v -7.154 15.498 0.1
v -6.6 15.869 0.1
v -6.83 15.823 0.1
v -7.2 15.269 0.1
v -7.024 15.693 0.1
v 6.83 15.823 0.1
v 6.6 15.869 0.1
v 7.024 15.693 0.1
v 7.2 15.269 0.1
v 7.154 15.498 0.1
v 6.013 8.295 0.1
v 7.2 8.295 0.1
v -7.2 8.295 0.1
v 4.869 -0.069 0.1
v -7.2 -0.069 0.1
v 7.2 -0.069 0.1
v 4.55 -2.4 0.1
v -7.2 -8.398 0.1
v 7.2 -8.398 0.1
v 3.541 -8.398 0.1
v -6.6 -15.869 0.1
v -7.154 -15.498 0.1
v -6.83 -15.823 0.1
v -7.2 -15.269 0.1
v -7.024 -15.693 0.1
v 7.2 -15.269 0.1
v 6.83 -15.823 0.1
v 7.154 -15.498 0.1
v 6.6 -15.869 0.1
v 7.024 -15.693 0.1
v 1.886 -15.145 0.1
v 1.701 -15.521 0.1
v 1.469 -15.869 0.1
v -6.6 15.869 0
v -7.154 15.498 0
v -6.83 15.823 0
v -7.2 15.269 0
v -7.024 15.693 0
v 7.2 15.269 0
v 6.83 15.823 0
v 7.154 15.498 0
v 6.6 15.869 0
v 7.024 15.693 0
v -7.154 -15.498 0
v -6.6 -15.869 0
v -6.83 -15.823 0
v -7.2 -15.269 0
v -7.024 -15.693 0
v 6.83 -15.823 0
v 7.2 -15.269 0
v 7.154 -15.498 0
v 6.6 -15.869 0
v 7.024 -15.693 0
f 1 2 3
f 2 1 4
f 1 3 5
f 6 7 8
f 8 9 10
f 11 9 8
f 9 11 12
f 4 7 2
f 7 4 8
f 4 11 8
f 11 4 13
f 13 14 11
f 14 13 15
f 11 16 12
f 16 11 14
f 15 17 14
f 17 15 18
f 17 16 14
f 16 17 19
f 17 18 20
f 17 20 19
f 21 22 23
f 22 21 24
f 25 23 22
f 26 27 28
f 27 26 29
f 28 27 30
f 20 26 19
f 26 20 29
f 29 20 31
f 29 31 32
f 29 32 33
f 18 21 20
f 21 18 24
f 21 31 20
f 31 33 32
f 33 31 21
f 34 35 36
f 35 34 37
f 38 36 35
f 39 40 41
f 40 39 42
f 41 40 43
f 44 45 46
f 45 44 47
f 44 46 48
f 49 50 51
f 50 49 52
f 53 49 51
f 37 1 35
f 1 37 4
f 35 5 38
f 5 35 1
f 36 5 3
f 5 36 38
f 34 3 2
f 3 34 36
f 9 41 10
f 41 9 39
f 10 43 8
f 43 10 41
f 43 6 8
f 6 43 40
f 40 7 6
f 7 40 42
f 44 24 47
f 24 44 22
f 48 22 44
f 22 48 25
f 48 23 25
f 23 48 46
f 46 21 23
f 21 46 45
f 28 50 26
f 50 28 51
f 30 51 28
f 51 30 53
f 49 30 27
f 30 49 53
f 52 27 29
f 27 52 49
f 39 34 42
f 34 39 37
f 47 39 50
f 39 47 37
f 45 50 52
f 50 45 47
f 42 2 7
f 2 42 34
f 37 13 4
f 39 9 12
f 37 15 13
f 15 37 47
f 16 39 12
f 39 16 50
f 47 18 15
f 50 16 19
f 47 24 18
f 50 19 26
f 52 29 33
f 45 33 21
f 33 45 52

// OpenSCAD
// file: ../p/1-4cyli.scad
use <../lib.scad>
function ldraw_lib__1_4cyli() = [
// 0 Cylinder 0.25
// 0 Name: 1-4cyli.dat
// 0 Author: James Jessiman
// 0 !LDRAW_ORG Primitive UPDATE 2012-01
// 0 !LICENSE Licensed under CC BY 4.0 : see CAreadme.txt
// 
// 0 BFC CERTIFY CCW
  [0,"BFC","CERTIFY"],
  [0,"BFC","CCW"],
// 
// 0 !HISTORY 2002-03-23 [sbliss] Added BFC statement.
// 0 !HISTORY 2002-04-25 [PTadmin] Official Update 2002-02
// 0 !HISTORY 2007-06-22 [PTadmin] Header formatted for Contributor Agreement
// 0 !HISTORY 2008-07-01 [PTadmin] Official Update 2008-01
// 0 !HISTORY 2012-02-16 [Philo] Changed to CCW
// 0 !HISTORY 2012-03-30 [PTadmin] Official Update 2012-01
// 
// 
// 4 16 1 1 0 0.9239 1 0.3827 0.9239 0 0.3827 1 0 0
  [4,16,1,1,0,0.9239,1,0.3827,0.9239,0,0.3827,1,0,0],
// 5 24 1 0 0 1 1 0 0.9239 0 0.3827 1 0 -1
  [5,24,1,0,0,1,1,0,0.9239,0,0.3827,1,0,-1],
// 4 16 0.9239 1 0.3827 0.7071 1 0.7071 0.7071 0 0.7071 0.9239 0 0.3827
  [4,16,0.9239,1,0.3827,0.7071,1,0.7071,0.7071,0,0.7071,0.9239,0,0.3827],
// 5 24 0.9239 0 0.3827 0.9239 1 0.3827 0.7071 0 0.7071 1 0 0
  [5,24,0.9239,0,0.3827,0.9239,1,0.3827,0.7071,0,0.7071,1,0,0],
// 4 16 0.7071 1 0.7071 0.3827 1 0.9239 0.3827 0 0.9239 0.7071 0 0.7071
  [4,16,0.7071,1,0.7071,0.3827,1,0.9239,0.3827,0,0.9239,0.7071,0,0.7071],
// 5 24 0.7071 0 0.7071 0.7071 1 0.7071 0.3827 0 0.9239 0.9239 0 0.3827
  [5,24,0.7071,0,0.7071,0.7071,1,0.7071,0.3827,0,0.9239,0.9239,0,0.3827],
// 4 16 0.3827 1 0.9239 0 1 1 0 0 1 0.3827 0 0.9239
  [4,16,0.3827,1,0.9239,0,1,1,0,0,1,0.3827,0,0.9239],
// 5 24 0.3827 0 0.9239 0.3827 1 0.9239 0 0 1 0.7071 0 0.7071
  [5,24,0.3827,0,0.9239,0.3827,1,0.9239,0,0,1,0.7071,0,0.7071],
// 5 24 0 0 1 0 1 1 0.3827 0 0.9239 -1 0 1
  [5,24,0,0,1,0,1,1,0.3827,0,0.9239,-1,0,1],
];
module ldraw_lib__1_4cyli(step=0, col=false, unit=2/5, alt=false, line=0.2, solid=!$preview)
    makepoly(ldraw_lib__1_4cyli(), step=step, col=col, unit=unit, alt=alt, line=line, solid=solid);
ldraw_lib__1_4cyli(line=0.2);
// file: ../p/1-8chrd.scad
use <../lib.scad>
function ldraw_lib__1_8chrd() = [
// 0 Chord 0.125
// 0 Name: 1-8chrd.dat
// 0 Author: Andy Westrate [westrate]
// 0 !LDRAW_ORG Primitive UPDATE 2004-02
// 0 !LICENSE Licensed under CC BY 2.0 and CC BY 4.0 : see CAreadme.txt
// 
// 0 BFC CERTIFY CCW
  [0,"BFC","CERTIFY"],
  [0,"BFC","CCW"],
// 
// 0 !HISTORY 2004-04-22 [PTadmin] Official Update 2004-02
// 0 !HISTORY 2007-06-22 [PTadmin] Header formatted for Contributor Agreement
// 0 !HISTORY 2008-07-01 [PTadmin] Official Update 2008-01
// 
// 
// 3 16 0.7071 0 0.7071 1 0 0 0.9239 0 0.3827
  [3,16,0.7071,0,0.7071,1,0,0,0.9239,0,0.3827],
// 
// 0
];
module ldraw_lib__1_8chrd(step=0, col=false, unit=2/5, alt=false, line=0.2, solid=!$preview)
    makepoly(ldraw_lib__1_8chrd(), step=step, col=col, unit=unit, alt=alt, line=line, solid=solid);
ldraw_lib__1_8chrd(line=0.2);
// file: ../p/1-4chrd.scad
use <../lib.scad>
function ldraw_lib__1_4chrd() = [
// 0 Chord 0.25
// 0 Name: 1-4chrd.dat
// 0 Author: Tony Hafner [hafhead]
// 0 !LDRAW_ORG Primitive UPDATE 2012-02
// 0 !LICENSE Licensed under CC BY 2.0 and CC BY 4.0 : see CAreadme.txt
// 
// 0 BFC CERTIFY CCW
  [0,"BFC","CERTIFY"],
  [0,"BFC","CCW"],
// 
// 0 !HISTORY 2004-04-22 [PTadmin] Official Update 2004-02
// 0 !HISTORY 2007-10-09 [PTadmin] Header formatted for Contributor Agreement
// 0 !HISTORY 2008-07-01 [PTadmin] Official Update 2008-01
// 0 !HISTORY 2012-08-02 [MMR1988] Re-creation with PrimGen2 and Rectifier
// 0 !HISTORY 2012-08-09 [PTadmin] Official Update 2012-02
// 
// 
// 4 16 0.9239 0 0.3827 0.3827 0 0.9239 0 0 1 1 0 0
  [4,16,0.9239,0,0.3827,0.3827,0,0.9239,0,0,1,1,0,0],
// 3 16 0.7071 0 0.7071 0.3827 0 0.9239 0.9239 0 0.3827
  [3,16,0.7071,0,0.7071,0.3827,0,0.9239,0.9239,0,0.3827],
];
module ldraw_lib__1_4chrd(step=0, col=false, unit=2/5, alt=false, line=0.2, solid=!$preview)
    makepoly(ldraw_lib__1_4chrd(), step=step, col=col, unit=unit, alt=alt, line=line, solid=solid);
ldraw_lib__1_4chrd(line=0.2);
// file: s/6142622ts05.scad
use <../../lib.scad>
use <../../p/1-4chrd.scad>
use <../../p/1-4cyli.scad>
function ldraw_lib__s__6142622ts05() = [
// 0 ~Sticker  4.0 x  1.8 with Black Arch on Yellow Background Right - Underside Flat
// 0 Name: s\6142622ts05.dat
// 0 Author: Massimo Maso [Sirio]
// 0 !LDRAW_ORG Subpart UPDATE 2022-03
// 0 !LICENSE Licensed under CC BY 4.0 : see CAreadme.txt
// 
// 0 BFC CERTIFY CCW
  [0,"BFC","CERTIFY"],
  [0,"BFC","CCW"],
// 
// 0 !HISTORY 2022-05-07 [PTadmin] Official Update 2022-03
// 
// 
// 0 // Primitives
// 
// 1 16 -16.5 0 38.1717 -1.5 0 0 0 -1 0 0 0 1.5 1-4chrd.dat
  [1,16,-16.5,0,38.1717,-1.5,0,0,0,-1,0,0,0,1.5, ldraw_lib__1_4chrd()],
// 1 16 16.5 0 38.1717 1.5 0 0 0 -1 0 0 0 1.5 1-4chrd.dat
  [1,16,16.5,0,38.1717,1.5,0,0,0,-1,0,0,0,1.5, ldraw_lib__1_4chrd()],
// 1 16 -16.5 0 -38.1717 -1.5 0 0 0 -1 0 0 0 -1.5 1-4chrd.dat
  [1,16,-16.5,0,-38.1717,-1.5,0,0,0,-1,0,0,0,-1.5, ldraw_lib__1_4chrd()],
// 1 16 16.5 0 -38.1717 1.5 0 0 0 -1 0 0 0 -1.5 1-4chrd.dat
  [1,16,16.5,0,-38.1717,1.5,0,0,0,-1,0,0,0,-1.5, ldraw_lib__1_4chrd()],
// 1 16 -16.5 -0.25 38.1717 -1.5 0 0 0 0.25 0 0 0 1.5 1-4cyli.dat
  [1,16,-16.5,-0.25,38.1717,-1.5,0,0,0,0.25,0,0,0,1.5, ldraw_lib__1_4cyli()],
// 1 16 16.5 -0.25 38.1717 1.5 0 0 0 0.25 0 0 0 1.5 1-4cyli.dat
  [1,16,16.5,-0.25,38.1717,1.5,0,0,0,0.25,0,0,0,1.5, ldraw_lib__1_4cyli()],
// 1 16 -16.5 -0.25 -38.1717 -1.5 0 0 0 0.25 0 0 0 -1.5 1-4cyli.dat
  [1,16,-16.5,-0.25,-38.1717,-1.5,0,0,0,0.25,0,0,0,-1.5, ldraw_lib__1_4cyli()],
// 1 16 16.5 -0.25 -38.1717 1.5 0 0 0 0.25 0 0 0 -1.5 1-4cyli.dat
  [1,16,16.5,-0.25,-38.1717,1.5,0,0,0,0.25,0,0,0,-1.5, ldraw_lib__1_4cyli()],
// 0 // Bottom face
// 4 16 16.5 0 39.6717 18 0 38.1717 -18 0 38.1717 -16.5 0 39.6717
  [4,16,16.5,0,39.6717,18,0,38.1717,-18,0,38.1717,-16.5,0,39.6717],
// 4 16 18 0 38.1717 18 0 -38.1717 -18 0 -38.1717 -18 0 38.1717
  [4,16,18,0,38.1717,18,0,-38.1717,-18,0,-38.1717,-18,0,38.1717],
// 4 16 -18 0 -38.1717 18 0 -38.1717 16.5 0 -39.6717 -16.5 0 -39.6717
  [4,16,-18,0,-38.1717,18,0,-38.1717,16.5,0,-39.6717,-16.5,0,-39.6717],
// 0 // Lateral faces
// 4 16 16.5 0 39.6717 -16.5 0 39.6717 -16.5 -.25 39.6717 16.5 -.25 39.6717
  [4,16,16.5,0,39.6717,-16.5,0,39.6717,-16.5,-.25,39.6717,16.5,-.25,39.6717],
// 3 16 -18 0 38.1717 -18 -.25 20.737 -18 -.25 38.1717
  [3,16,-18,0,38.1717,-18,-.25,20.737,-18,-.25,38.1717],
// 3 16 18 0 38.1717 18 -.25 38.1717 18 -.25 20.737
  [3,16,18,0,38.1717,18,-.25,38.1717,18,-.25,20.737],
// 4 16 -18 0 38.1717 -18 0 -38.1717 -18 -.25 -.1714 -18 -.25 20.737
  [4,16,-18,0,38.1717,-18,0,-38.1717,-18,-.25,-.1714,-18,-.25,20.737],
// 4 16 18 0 38.1717 18 -.25 20.737 18 -.25 -.1714 18 0 -38.1717
  [4,16,18,0,38.1717,18,-.25,20.737,18,-.25,-.1714,18,0,-38.1717],
// 3 16 -18 0 -38.1717 -18 -.25 -20.994 -18 -.25 -.1714
  [3,16,-18,0,-38.1717,-18,-.25,-20.994,-18,-.25,-.1714],
// 3 16 18 0 -38.1717 18 -.25 -.1714 18 -.25 -20.994
  [3,16,18,0,-38.1717,18,-.25,-.1714,18,-.25,-20.994],
// 3 16 -18 0 -38.1717 -18 -.25 -38.1717 -18 -.25 -20.994
  [3,16,-18,0,-38.1717,-18,-.25,-38.1717,-18,-.25,-20.994],
// 3 16 18 0 -38.1717 18 -.25 -20.994 18 -.25 -38.1717
  [3,16,18,0,-38.1717,18,-.25,-20.994,18,-.25,-38.1717],
// 3 16 16.5 0 -39.6717 16.5 -.25 -39.6717 3.6722 -.25 -39.6717
  [3,16,16.5,0,-39.6717,16.5,-.25,-39.6717,3.6722,-.25,-39.6717],
// 4 16 16.5 0 -39.6717 3.6722 -.25 -39.6717 -16.5 -.25 -39.6717 -16.5 0 -39.6717
  [4,16,16.5,0,-39.6717,3.6722,-.25,-39.6717,-16.5,-.25,-39.6717,-16.5,0,-39.6717],
];
module ldraw_lib__s__6142622ts05(step=0, col=false, unit=2/5, alt=false, line=0.2, solid=!$preview)
    makepoly(ldraw_lib__s__6142622ts05(), step=step, col=col, unit=unit, alt=alt, line=line, solid=solid);
ldraw_lib__s__6142622ts05(line=0.2);
// file: s/6142622ts04.scad
use <../../lib.scad>
use <../../p/1-4chrd.scad>
function ldraw_lib__s__6142622ts04() = [
// 0 ~Sticker  4.0 x  1.8 with Black Arch on Yellow Background Right - Upper Section 4
// 0 Name: s\6142622ts04.dat
// 0 Author: Massimo Maso [Sirio]
// 0 !LDRAW_ORG Subpart UPDATE 2022-03
// 0 !LICENSE Licensed under CC BY 4.0 : see CAreadme.txt
// 
// 0 BFC CERTIFY CCW
  [0,"BFC","CERTIFY"],
  [0,"BFC","CCW"],
// 
// 0 !HISTORY 2022-05-07 [PTadmin] Official Update 2022-03
// 
// 
// 0 // Primitives
// 
// 1 0 -16.5 -.25 -17.162 -1.5 0 0 0 1 0 0 0 -1.5 1-4chrd.dat
  [1,0,-16.5,-.25,-17.162,-1.5,0,0,0,1,0,0,0,-1.5, ldraw_lib__1_4chrd()],
// 1 14 16.5 -.25 -17.162 1.5 0 0 0 1 0 0 0 -1.5 1-4chrd.dat
  [1,14,16.5,-.25,-17.162,1.5,0,0,0,1,0,0,0,-1.5, ldraw_lib__1_4chrd()],
// 0 // Yellow faces
// 4 14 16.5 -.25 -18.662 18 -.25 -17.162 18 -.25 .0157 8.8524 -.25 .0157
  [4,14,16.5,-.25,-18.662,18,-.25,-17.162,18,-.25,.0157,8.8524,-.25,.0157],
// 3 14 16.5 -.25 -18.662 8.8524 -.25 .0157 4.7162 -.25 -16.8532
  [3,14,16.5,-.25,-18.662,8.8524,-.25,.0157,4.7162,-.25,-16.8532],
// 3 14 16.5 -.25 -18.662 4.7162 -.25 -16.8532 4.253 -.25 -17.7916
  [3,14,16.5,-.25,-18.662,4.7162,-.25,-16.8532,4.253,-.25,-17.7916],
// 3 14 16.5 -.25 -18.662 4.253 -.25 -17.7916 3.6722 -.25 -18.662
  [3,14,16.5,-.25,-18.662,4.253,-.25,-17.7916,3.6722,-.25,-18.662],
// 0 // Black faces
// 4 0 -16.5 -.25 -18.662 8.8524 -.25 .0157 -18 -.25 .0157 -18 -.25 -17.162
  [4,0,-16.5,-.25,-18.662,8.8524,-.25,.0157,-18,-.25,.0157,-18,-.25,-17.162],
// 3 0 -16.5 -.25 -18.662 4.7162 -.25 -16.8532 8.8524 -.25 .0157
  [3,0,-16.5,-.25,-18.662,4.7162,-.25,-16.8532,8.8524,-.25,.0157],
// 4 0 -16.5 -.25 -18.662 3.6722 -.25 -18.662 4.253 -.25 -17.7916 4.7162 -.25 -16.8532
  [4,0,-16.5,-.25,-18.662,3.6722,-.25,-18.662,4.253,-.25,-17.7916,4.7162,-.25,-16.8532],
];
module ldraw_lib__s__6142622ts04(step=0, col=false, unit=2/5, alt=false, line=0.2, solid=!$preview)
    makepoly(ldraw_lib__s__6142622ts04(), step=step, col=col, unit=unit, alt=alt, line=line, solid=solid);
ldraw_lib__s__6142622ts04(line=0.2);
// file: s/6142622ts03.scad
use <../../lib.scad>
function ldraw_lib__s__6142622ts03() = [
// 0 ~Sticker  4.0 x  1.8 with Black Arch on Yellow Background Right - Upper Section 3
// 0 Name: s\6142622ts03.dat
// 0 Author: Massimo Maso [Sirio]
// 0 !LDRAW_ORG Subpart UPDATE 2022-03
// 0 !LICENSE Licensed under CC BY 4.0 : see CAreadme.txt
// 
// 0 BFC CERTIFY CCW
  [0,"BFC","CERTIFY"],
  [0,"BFC","CCW"],
// 
// 0 !HISTORY 2022-05-07 [PTadmin] Official Update 2022-03
// 
// 
// 0 // Faces
// 
// 4 0 11.375 -.25 14.9783 12.1721 -.25 20.8069 -18 -.25 20.8069 -18 -.25 -.0157
  [4,0,11.375,-.25,14.9783,12.1721,-.25,20.8069,-18,-.25,20.8069,-18,-.25,-.0157],
// 4 14 11.375 -.25 14.9783 18 -.25 -.0157 18 -.25 20.8069 12.1721 -.25 20.8069
  [4,14,11.375,-.25,14.9783,18,-.25,-.0157,18,-.25,20.8069,12.1721,-.25,20.8069],
// 3 0 11.375 -.25 14.9783 -18 -.25 -.0157 8.8524 -.25 -.0157
  [3,0,11.375,-.25,14.9783,-18,-.25,-.0157,8.8524,-.25,-.0157],
// 3 14 11.375 -.25 14.9783 8.8524 -.25 -.0157 18 -.25 -.0157
  [3,14,11.375,-.25,14.9783,8.8524,-.25,-.0157,18,-.25,-.0157],
];
module ldraw_lib__s__6142622ts03(step=0, col=false, unit=2/5, alt=false, line=0.2, solid=!$preview)
    makepoly(ldraw_lib__s__6142622ts03(), step=step, col=col, unit=unit, alt=alt, line=line, solid=solid);
ldraw_lib__s__6142622ts03(line=0.2);
// file: s/6142622ts02.scad
use <../../lib.scad>
function ldraw_lib__s__6142622ts02() = [
// 0 ~Sticker  4.0 x  1.8 with Black Arch on Yellow Background Right - Upper Section 2
// 0 Name: s\6142622ts02.dat
// 0 Author: Massimo Maso [Sirio]
// 0 !LDRAW_ORG Subpart UPDATE 2022-03
// 0 !LICENSE Licensed under CC BY 4.0 : see CAreadme.txt
// 
// 0 BFC CERTIFY CCW
  [0,"BFC","CERTIFY"],
  [0,"BFC","CCW"],
// 
// 0 !HISTORY 2022-05-07 [PTadmin] Official Update 2022-03
// 
// 
// 0 // Faces
// 
// 4 0 15.0314 -.25 .0153 -18 -.25 .0153 -18 -.25 -20.8931 12.1721 -.25 -20.8931
  [4,0,15.0314,-.25,.0153,-18,-.25,.0153,-18,-.25,-20.8931,12.1721,-.25,-20.8931],
// 4 14 15.0314 -.25 .0153 12.1721 -.25 -20.8931 18 -.25 -20.8931 18 -.25 .0153
  [4,14,15.0314,-.25,.0153,12.1721,-.25,-20.8931,18,-.25,-20.8931,18,-.25,.0153],
];
module ldraw_lib__s__6142622ts02(step=0, col=false, unit=2/5, alt=false, line=0.2, solid=!$preview)
    makepoly(ldraw_lib__s__6142622ts02(), step=step, col=col, unit=unit, alt=alt, line=line, solid=solid);
ldraw_lib__s__6142622ts02(line=0.2);
// file: s/6142622ts01.scad
use <../../lib.scad>
use <../../p/1-4chrd.scad>
use <../../p/1-8chrd.scad>
function ldraw_lib__s__6142622ts01() = [
// 0 ~Sticker  4.0 x  1.8 with Black Arch on Yellow Background Right - Upper Section 1
// 0 Name: s\6142622ts01.dat
// 0 Author: Massimo Maso [Sirio]
// 0 !LDRAW_ORG Subpart UPDATE 2022-03
// 0 !LICENSE Licensed under CC BY 4.0 : see CAreadme.txt
// 
// 0 BFC CERTIFY CCW
  [0,"BFC","CERTIFY"],
  [0,"BFC","CCW"],
// 
// 0 !HISTORY 2022-05-07 [PTadmin] Official Update 2022-03
// 
// 
// 0 // Primitives
// 
// 1 0 -16.5 -.25 17.4194 -1.5 0 0 0 1 0 0 0 1.5 1-4chrd.dat
  [1,0,-16.5,-.25,17.4194,-1.5,0,0,0,1,0,0,0,1.5, ldraw_lib__1_4chrd()],
// 1 0 16.5 -.25 17.4194 0 0 1.5 0 1 0 1.5 0 0 1-8chrd.dat
  [1,0,16.5,-.25,17.4194,0,0,1.5,0,1,0,1.5,0,0, ldraw_lib__1_8chrd()],
// 1 14 16.5 -.25 17.4194 1.5 0 0 0 1 0 0 0 1.5 1-8chrd.dat
  [1,14,16.5,-.25,17.4194,1.5,0,0,0,1,0,0,0,1.5, ldraw_lib__1_8chrd()],
// 0 // Yellow face
// 4 14 17.56065 -.25 18.48005 15.0314 -.25 -.0153 18 -.25 -.0153 18 -.25 17.4194
  [4,14,17.56065,-.25,18.48005,15.0314,-.25,-.0153,18,-.25,-.0153,18,-.25,17.4194],
// 0 // Black faces
// 4 0 17.56065 -.25 18.48005 16.5 -.25 18.9194 -16.5 -.25 18.9194 -18 -.25 17.4194
  [4,0,17.56065,-.25,18.48005,16.5,-.25,18.9194,-16.5,-.25,18.9194,-18,-.25,17.4194],
// 4 0 17.56065 -.25 18.48005 -18 -.25 17.4194 -18 -.25 -.0153 15.0314 -.25 -.0153
  [4,0,17.56065,-.25,18.48005,-18,-.25,17.4194,-18,-.25,-.0153,15.0314,-.25,-.0153],
];
module ldraw_lib__s__6142622ts01(step=0, col=false, unit=2/5, alt=false, line=0.2, solid=!$preview)
    makepoly(ldraw_lib__s__6142622ts01(), step=step, col=col, unit=unit, alt=alt, line=line, solid=solid);
ldraw_lib__s__6142622ts01(line=0.2);
// main file
use <../lib.scad>
use <s/6142622ts01.scad>
use <s/6142622ts02.scad>
use <s/6142622ts03.scad>
use <s/6142622ts04.scad>
use <s/6142622ts05.scad>
function ldraw_lib__6142622t() = [
// 0 Sticker  4.0 x  1.8 with Black Arch on Yellow Background Right
// 0 Name: 6142622t.dat
// 0 Author: Massimo Maso [Sirio]
// 0 !LDRAW_ORG Part UPDATE 2022-03
// 0 !LICENSE Licensed under CC BY 4.0 : see CAreadme.txt
// 
// 0 BFC CERTIFY CCW
  [0,"BFC","CERTIFY"],
  [0,"BFC","CCW"],
// 
// 0 !KEYWORDS Chevrolet, Corvette, Set 75870, Speed Champions
// 
// 0 !HISTORY 2022-05-07 [PTadmin] Official Update 2022-03
// 
// 
// 1 16 0 0 20.7523 1 0 0 0 1 0 0 0 1 s\6142622ts01.dat
  [1,16,0,0,20.7523,1,0,0,0,1,0,0,0,1, ldraw_lib__s__6142622ts01()],
// 1 16 0 0 20.7217 1 0 0 0 1 0 0 0 1 s\6142622ts02.dat
  [1,16,0,0,20.7217,1,0,0,0,1,0,0,0,1, ldraw_lib__s__6142622ts02()],
// 1 16 0 0 -20.9783 1 0 0 0 1 0 0 0 1 s\6142622ts03.dat
  [1,16,0,0,-20.9783,1,0,0,0,1,0,0,0,1, ldraw_lib__s__6142622ts03()],
// 1 16 0 0 -21.0097 1 0 0 0 1 0 0 0 1 s\6142622ts04.dat
  [1,16,0,0,-21.0097,1,0,0,0,1,0,0,0,1, ldraw_lib__s__6142622ts04()],
// 1 16 0 0 0 1 0 0 0 1 0 0 0 1 s\6142622ts05.dat
  [1,16,0,0,0,1,0,0,0,1,0,0,0,1, ldraw_lib__s__6142622ts05()],
];
module ldraw_lib__6142622t(step=0, col=false, unit=2/5, alt=false, line=0.2, solid=!$preview)
    makepoly(ldraw_lib__6142622t(), step=step, col=col, unit=unit, alt=alt, line=line, solid=solid);
ldraw_lib__6142622t(line=0.2);
